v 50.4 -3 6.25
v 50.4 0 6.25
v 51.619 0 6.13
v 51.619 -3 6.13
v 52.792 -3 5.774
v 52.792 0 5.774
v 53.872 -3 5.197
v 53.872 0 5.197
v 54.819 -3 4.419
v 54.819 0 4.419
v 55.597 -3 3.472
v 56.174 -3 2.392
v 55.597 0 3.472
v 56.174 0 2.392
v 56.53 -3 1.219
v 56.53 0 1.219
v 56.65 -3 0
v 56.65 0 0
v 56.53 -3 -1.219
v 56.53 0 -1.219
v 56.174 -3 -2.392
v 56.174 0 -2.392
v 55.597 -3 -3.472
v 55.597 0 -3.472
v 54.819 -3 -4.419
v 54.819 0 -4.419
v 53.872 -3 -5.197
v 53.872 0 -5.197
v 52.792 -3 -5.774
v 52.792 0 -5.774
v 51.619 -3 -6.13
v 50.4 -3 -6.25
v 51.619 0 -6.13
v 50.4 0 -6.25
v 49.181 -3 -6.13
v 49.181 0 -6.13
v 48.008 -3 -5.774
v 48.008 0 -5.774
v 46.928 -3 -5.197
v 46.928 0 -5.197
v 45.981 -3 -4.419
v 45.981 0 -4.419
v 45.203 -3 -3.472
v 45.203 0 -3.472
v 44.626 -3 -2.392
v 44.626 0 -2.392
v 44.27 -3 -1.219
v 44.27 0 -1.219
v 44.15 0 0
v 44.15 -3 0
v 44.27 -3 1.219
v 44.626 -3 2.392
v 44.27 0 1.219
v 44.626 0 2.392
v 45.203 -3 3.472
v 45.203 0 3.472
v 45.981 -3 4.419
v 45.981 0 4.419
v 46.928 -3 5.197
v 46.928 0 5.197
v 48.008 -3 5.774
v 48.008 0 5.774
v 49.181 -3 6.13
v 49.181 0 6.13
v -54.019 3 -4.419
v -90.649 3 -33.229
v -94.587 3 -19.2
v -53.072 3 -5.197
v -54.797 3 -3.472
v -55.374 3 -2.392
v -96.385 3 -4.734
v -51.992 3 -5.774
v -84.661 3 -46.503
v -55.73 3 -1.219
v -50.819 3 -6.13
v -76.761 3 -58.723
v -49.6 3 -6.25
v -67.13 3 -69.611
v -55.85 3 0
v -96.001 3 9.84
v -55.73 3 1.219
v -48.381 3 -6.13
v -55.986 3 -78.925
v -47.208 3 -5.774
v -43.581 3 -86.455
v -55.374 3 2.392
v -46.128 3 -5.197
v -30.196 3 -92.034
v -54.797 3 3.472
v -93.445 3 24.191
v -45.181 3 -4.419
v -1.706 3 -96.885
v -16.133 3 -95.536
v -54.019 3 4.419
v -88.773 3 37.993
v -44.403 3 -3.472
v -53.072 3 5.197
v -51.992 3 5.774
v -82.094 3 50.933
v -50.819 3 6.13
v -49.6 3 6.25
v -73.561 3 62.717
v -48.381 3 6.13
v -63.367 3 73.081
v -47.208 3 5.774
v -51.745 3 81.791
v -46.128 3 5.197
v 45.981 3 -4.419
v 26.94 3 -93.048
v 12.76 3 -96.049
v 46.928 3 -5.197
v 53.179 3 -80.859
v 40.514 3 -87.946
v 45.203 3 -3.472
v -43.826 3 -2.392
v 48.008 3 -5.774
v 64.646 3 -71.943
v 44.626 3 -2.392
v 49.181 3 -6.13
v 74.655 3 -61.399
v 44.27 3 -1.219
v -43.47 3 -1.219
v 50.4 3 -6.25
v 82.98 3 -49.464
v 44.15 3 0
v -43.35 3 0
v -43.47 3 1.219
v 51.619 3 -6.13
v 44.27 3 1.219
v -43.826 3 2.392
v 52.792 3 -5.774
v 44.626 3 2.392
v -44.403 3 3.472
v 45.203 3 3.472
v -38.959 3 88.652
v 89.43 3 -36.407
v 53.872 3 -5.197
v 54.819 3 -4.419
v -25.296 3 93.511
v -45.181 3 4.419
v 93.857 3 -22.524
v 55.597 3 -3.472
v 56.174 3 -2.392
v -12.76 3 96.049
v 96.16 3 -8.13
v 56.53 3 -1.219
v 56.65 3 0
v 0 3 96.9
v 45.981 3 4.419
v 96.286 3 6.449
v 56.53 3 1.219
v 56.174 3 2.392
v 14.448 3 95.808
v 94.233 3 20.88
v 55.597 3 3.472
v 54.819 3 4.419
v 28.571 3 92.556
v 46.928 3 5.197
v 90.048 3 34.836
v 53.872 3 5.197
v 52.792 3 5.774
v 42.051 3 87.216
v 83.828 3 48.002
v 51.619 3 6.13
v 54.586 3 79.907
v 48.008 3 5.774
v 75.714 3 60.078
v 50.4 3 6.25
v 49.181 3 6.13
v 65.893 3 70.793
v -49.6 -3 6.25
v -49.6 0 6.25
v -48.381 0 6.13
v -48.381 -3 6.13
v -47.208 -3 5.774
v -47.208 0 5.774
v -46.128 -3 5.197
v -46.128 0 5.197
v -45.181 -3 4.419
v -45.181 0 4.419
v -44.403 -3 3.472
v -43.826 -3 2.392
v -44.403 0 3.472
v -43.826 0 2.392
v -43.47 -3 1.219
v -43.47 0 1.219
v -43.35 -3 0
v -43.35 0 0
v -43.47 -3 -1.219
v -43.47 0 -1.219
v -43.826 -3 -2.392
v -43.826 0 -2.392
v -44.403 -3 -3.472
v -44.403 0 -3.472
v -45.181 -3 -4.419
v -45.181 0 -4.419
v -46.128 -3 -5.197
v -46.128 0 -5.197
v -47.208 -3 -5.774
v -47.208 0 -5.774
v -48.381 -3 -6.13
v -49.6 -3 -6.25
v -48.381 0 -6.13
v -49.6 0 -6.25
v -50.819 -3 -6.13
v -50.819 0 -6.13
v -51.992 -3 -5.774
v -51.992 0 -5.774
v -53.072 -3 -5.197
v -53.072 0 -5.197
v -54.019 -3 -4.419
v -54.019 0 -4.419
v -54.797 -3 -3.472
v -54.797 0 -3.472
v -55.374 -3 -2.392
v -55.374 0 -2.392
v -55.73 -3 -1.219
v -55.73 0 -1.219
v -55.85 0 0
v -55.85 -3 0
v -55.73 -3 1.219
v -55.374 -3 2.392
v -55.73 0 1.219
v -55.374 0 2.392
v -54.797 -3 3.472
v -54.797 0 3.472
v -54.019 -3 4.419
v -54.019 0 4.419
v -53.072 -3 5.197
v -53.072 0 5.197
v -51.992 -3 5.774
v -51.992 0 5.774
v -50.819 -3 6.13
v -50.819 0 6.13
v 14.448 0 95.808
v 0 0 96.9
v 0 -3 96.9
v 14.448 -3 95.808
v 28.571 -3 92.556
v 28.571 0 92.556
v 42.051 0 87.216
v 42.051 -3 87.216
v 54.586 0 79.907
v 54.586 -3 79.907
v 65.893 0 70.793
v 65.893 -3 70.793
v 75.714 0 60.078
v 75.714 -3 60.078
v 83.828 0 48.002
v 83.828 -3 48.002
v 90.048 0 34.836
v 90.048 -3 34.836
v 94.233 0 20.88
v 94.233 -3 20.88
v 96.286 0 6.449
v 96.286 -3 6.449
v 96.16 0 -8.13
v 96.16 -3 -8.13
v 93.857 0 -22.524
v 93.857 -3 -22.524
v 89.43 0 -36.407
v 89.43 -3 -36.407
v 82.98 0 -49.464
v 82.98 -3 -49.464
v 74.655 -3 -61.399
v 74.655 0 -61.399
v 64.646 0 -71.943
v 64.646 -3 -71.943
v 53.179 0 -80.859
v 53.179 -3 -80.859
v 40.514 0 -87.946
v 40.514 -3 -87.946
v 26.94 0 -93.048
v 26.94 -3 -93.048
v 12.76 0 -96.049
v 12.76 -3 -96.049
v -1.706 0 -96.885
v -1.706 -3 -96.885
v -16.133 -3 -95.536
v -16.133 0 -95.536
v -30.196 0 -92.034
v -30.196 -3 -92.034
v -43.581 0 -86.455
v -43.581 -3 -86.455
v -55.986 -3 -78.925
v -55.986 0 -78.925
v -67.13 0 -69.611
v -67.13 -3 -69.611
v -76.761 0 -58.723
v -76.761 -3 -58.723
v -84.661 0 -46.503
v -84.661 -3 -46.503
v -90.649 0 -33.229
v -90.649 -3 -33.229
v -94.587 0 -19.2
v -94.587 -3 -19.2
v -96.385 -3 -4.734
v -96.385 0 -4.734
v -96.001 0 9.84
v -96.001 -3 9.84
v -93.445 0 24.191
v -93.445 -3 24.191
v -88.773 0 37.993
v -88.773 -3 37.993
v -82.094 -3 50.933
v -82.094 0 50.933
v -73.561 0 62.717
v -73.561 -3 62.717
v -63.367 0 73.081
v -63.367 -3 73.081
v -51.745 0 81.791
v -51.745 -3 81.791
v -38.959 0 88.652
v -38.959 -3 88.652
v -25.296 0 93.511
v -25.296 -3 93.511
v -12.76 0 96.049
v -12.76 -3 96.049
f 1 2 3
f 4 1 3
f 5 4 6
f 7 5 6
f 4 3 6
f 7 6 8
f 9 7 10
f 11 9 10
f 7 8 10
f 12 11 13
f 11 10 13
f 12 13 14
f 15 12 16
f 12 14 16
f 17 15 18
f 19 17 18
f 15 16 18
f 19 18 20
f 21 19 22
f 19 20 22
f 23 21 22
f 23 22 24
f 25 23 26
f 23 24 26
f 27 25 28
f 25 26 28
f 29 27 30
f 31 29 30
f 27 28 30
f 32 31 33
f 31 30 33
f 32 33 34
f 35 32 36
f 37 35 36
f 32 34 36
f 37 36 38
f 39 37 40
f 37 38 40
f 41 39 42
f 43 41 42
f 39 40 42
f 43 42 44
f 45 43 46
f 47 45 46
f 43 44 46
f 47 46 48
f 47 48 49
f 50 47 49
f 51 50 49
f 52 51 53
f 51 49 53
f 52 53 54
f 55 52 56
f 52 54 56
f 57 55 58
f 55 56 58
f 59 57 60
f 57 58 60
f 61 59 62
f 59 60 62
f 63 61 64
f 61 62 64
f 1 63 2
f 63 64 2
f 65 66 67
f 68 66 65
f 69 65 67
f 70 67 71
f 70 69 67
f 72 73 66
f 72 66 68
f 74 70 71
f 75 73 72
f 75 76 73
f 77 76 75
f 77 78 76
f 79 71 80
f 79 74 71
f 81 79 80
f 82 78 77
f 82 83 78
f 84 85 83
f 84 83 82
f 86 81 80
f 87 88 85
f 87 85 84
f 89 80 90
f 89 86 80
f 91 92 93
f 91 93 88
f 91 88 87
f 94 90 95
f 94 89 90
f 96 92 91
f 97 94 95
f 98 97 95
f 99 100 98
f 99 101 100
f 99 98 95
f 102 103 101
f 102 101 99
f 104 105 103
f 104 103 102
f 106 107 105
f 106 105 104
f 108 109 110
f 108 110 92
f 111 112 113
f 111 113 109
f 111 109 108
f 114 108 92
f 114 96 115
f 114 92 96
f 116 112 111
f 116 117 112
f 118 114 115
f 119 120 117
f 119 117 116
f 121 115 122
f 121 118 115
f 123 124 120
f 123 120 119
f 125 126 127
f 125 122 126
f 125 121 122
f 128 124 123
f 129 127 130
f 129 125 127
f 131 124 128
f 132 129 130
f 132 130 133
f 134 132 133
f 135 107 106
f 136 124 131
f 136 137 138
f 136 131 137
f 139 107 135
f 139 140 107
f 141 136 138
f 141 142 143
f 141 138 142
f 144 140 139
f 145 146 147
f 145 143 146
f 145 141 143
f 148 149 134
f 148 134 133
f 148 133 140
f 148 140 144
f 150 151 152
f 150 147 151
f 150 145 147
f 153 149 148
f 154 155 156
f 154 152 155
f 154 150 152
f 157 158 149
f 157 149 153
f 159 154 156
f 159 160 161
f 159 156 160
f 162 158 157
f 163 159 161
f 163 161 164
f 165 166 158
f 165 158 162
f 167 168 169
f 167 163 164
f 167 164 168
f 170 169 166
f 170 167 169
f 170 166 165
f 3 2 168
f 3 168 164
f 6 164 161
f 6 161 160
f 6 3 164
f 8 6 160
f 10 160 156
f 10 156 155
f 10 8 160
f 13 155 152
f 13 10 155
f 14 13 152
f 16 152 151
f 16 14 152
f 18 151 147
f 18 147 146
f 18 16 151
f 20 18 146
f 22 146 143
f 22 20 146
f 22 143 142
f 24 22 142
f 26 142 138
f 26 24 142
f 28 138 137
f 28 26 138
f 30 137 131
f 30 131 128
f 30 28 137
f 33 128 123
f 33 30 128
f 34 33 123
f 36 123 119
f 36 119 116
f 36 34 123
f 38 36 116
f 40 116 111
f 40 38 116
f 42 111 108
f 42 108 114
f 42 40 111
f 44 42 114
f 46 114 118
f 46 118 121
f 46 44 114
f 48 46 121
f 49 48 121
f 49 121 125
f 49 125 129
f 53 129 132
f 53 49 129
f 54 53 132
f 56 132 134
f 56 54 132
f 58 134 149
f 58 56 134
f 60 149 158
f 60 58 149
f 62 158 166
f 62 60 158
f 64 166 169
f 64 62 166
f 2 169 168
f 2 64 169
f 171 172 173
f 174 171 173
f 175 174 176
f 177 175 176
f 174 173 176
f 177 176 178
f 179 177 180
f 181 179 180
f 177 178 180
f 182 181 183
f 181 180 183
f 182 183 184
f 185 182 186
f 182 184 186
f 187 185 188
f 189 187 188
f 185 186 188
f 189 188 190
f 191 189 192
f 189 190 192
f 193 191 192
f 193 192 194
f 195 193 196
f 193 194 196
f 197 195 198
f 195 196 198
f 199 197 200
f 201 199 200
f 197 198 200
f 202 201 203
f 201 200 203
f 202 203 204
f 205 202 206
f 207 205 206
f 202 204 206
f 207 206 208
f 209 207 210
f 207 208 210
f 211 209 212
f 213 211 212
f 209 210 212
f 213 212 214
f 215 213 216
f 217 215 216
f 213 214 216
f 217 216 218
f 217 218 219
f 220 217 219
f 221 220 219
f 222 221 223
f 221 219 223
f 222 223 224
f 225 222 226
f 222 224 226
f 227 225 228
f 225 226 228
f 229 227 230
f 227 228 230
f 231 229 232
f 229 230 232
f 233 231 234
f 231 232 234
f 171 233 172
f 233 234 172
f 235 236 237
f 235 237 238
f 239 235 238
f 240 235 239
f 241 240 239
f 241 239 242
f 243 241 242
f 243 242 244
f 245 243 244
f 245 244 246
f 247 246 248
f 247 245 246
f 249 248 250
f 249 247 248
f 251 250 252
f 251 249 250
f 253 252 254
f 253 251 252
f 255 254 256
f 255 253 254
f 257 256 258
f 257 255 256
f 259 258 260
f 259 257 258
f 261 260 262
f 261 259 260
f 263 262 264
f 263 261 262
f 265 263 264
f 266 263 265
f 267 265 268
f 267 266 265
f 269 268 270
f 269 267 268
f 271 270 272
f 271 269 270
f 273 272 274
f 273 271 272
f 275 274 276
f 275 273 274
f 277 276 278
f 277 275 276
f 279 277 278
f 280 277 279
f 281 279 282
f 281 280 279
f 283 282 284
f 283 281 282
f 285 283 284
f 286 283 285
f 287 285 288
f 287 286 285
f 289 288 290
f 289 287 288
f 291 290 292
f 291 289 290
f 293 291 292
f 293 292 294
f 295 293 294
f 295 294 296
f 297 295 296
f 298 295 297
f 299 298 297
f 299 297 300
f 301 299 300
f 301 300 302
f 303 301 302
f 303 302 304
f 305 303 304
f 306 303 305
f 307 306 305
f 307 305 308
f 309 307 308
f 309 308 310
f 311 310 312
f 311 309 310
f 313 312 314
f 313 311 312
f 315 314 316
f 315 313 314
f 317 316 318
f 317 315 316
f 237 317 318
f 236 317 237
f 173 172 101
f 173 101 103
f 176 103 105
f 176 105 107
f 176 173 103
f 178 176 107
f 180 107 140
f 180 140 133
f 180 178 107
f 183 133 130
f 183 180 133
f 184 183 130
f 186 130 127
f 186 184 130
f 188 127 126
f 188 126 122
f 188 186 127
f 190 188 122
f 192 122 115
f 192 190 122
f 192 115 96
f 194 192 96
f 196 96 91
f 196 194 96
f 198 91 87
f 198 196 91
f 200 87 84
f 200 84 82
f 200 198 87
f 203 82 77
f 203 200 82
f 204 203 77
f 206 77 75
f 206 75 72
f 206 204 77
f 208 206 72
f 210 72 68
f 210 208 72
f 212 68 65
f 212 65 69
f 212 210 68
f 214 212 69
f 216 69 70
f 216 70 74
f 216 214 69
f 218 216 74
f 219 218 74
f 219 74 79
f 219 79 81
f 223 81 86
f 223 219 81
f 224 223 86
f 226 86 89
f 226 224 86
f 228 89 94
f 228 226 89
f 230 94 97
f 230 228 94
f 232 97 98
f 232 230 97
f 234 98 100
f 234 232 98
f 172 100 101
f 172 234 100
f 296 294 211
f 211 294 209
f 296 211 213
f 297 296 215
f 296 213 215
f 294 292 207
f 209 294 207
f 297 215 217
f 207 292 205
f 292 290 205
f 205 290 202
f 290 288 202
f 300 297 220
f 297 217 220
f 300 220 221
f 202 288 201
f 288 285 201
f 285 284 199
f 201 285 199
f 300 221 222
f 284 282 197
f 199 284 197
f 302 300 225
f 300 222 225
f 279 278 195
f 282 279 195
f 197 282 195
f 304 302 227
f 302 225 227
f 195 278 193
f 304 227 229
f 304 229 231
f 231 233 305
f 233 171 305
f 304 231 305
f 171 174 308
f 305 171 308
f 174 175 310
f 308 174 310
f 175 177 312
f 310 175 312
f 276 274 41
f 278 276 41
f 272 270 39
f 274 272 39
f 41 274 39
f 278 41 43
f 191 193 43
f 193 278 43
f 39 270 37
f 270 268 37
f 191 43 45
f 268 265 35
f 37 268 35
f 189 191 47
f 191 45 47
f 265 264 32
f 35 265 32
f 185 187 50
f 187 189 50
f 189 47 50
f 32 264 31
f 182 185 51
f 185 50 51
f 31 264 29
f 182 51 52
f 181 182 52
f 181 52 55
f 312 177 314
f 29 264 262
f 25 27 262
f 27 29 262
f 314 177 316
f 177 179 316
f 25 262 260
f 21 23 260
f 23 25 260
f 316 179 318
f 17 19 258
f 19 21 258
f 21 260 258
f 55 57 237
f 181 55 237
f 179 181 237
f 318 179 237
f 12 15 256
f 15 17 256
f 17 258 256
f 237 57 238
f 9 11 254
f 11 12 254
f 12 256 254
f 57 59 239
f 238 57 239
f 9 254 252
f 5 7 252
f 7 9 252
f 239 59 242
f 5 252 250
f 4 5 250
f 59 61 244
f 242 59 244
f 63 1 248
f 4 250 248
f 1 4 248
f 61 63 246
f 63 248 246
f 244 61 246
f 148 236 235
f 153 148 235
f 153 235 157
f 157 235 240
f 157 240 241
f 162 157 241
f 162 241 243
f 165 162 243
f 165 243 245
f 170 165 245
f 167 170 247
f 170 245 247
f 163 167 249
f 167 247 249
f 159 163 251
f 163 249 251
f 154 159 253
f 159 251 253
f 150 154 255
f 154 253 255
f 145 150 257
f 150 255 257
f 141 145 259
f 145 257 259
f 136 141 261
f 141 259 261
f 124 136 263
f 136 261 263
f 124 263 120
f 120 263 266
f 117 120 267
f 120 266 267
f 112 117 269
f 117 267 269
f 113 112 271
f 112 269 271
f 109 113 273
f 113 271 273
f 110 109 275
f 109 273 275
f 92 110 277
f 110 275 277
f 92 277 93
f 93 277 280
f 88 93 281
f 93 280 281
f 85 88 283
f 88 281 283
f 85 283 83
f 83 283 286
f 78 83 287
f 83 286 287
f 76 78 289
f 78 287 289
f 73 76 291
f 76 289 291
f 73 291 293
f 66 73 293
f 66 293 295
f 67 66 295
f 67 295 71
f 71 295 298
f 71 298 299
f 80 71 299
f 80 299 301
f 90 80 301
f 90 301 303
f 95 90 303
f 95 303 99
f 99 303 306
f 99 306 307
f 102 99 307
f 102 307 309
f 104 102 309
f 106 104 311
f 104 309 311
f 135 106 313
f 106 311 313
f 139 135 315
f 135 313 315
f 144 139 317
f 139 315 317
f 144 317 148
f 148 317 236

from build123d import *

# Parameters (mm, degrees)
SKETCH1_RX          = 96.9
SKETCH1_RY          = 96.5
SKETCH1_R           = 6.25
BOSS_EXTRUDE1_DEPTH = 3


with BuildPart() as part:
    # Sketch1 → Boss-Extrude1 (new, symmetric)
    with BuildSketch(Plane(origin=(0, 0, 0), x_dir=(1, 0, 0), z_dir=(0, 1, 0))):
        with Locations(Location((0, 0), (0, 0, -90))):
            Ellipse(SKETCH1_RX, SKETCH1_RY)
        with Locations(Location((-49.6, 0, 0), (0, 0, 270))):
            Circle(SKETCH1_R, mode=Mode.SUBTRACT)
        with Locations(Location((50.4, 0, 0), (0, 0, 270))):
            Circle(SKETCH1_R, mode=Mode.SUBTRACT)
    extrude(amount=BOSS_EXTRUDE1_DEPTH, both=True)


solid = part.part
